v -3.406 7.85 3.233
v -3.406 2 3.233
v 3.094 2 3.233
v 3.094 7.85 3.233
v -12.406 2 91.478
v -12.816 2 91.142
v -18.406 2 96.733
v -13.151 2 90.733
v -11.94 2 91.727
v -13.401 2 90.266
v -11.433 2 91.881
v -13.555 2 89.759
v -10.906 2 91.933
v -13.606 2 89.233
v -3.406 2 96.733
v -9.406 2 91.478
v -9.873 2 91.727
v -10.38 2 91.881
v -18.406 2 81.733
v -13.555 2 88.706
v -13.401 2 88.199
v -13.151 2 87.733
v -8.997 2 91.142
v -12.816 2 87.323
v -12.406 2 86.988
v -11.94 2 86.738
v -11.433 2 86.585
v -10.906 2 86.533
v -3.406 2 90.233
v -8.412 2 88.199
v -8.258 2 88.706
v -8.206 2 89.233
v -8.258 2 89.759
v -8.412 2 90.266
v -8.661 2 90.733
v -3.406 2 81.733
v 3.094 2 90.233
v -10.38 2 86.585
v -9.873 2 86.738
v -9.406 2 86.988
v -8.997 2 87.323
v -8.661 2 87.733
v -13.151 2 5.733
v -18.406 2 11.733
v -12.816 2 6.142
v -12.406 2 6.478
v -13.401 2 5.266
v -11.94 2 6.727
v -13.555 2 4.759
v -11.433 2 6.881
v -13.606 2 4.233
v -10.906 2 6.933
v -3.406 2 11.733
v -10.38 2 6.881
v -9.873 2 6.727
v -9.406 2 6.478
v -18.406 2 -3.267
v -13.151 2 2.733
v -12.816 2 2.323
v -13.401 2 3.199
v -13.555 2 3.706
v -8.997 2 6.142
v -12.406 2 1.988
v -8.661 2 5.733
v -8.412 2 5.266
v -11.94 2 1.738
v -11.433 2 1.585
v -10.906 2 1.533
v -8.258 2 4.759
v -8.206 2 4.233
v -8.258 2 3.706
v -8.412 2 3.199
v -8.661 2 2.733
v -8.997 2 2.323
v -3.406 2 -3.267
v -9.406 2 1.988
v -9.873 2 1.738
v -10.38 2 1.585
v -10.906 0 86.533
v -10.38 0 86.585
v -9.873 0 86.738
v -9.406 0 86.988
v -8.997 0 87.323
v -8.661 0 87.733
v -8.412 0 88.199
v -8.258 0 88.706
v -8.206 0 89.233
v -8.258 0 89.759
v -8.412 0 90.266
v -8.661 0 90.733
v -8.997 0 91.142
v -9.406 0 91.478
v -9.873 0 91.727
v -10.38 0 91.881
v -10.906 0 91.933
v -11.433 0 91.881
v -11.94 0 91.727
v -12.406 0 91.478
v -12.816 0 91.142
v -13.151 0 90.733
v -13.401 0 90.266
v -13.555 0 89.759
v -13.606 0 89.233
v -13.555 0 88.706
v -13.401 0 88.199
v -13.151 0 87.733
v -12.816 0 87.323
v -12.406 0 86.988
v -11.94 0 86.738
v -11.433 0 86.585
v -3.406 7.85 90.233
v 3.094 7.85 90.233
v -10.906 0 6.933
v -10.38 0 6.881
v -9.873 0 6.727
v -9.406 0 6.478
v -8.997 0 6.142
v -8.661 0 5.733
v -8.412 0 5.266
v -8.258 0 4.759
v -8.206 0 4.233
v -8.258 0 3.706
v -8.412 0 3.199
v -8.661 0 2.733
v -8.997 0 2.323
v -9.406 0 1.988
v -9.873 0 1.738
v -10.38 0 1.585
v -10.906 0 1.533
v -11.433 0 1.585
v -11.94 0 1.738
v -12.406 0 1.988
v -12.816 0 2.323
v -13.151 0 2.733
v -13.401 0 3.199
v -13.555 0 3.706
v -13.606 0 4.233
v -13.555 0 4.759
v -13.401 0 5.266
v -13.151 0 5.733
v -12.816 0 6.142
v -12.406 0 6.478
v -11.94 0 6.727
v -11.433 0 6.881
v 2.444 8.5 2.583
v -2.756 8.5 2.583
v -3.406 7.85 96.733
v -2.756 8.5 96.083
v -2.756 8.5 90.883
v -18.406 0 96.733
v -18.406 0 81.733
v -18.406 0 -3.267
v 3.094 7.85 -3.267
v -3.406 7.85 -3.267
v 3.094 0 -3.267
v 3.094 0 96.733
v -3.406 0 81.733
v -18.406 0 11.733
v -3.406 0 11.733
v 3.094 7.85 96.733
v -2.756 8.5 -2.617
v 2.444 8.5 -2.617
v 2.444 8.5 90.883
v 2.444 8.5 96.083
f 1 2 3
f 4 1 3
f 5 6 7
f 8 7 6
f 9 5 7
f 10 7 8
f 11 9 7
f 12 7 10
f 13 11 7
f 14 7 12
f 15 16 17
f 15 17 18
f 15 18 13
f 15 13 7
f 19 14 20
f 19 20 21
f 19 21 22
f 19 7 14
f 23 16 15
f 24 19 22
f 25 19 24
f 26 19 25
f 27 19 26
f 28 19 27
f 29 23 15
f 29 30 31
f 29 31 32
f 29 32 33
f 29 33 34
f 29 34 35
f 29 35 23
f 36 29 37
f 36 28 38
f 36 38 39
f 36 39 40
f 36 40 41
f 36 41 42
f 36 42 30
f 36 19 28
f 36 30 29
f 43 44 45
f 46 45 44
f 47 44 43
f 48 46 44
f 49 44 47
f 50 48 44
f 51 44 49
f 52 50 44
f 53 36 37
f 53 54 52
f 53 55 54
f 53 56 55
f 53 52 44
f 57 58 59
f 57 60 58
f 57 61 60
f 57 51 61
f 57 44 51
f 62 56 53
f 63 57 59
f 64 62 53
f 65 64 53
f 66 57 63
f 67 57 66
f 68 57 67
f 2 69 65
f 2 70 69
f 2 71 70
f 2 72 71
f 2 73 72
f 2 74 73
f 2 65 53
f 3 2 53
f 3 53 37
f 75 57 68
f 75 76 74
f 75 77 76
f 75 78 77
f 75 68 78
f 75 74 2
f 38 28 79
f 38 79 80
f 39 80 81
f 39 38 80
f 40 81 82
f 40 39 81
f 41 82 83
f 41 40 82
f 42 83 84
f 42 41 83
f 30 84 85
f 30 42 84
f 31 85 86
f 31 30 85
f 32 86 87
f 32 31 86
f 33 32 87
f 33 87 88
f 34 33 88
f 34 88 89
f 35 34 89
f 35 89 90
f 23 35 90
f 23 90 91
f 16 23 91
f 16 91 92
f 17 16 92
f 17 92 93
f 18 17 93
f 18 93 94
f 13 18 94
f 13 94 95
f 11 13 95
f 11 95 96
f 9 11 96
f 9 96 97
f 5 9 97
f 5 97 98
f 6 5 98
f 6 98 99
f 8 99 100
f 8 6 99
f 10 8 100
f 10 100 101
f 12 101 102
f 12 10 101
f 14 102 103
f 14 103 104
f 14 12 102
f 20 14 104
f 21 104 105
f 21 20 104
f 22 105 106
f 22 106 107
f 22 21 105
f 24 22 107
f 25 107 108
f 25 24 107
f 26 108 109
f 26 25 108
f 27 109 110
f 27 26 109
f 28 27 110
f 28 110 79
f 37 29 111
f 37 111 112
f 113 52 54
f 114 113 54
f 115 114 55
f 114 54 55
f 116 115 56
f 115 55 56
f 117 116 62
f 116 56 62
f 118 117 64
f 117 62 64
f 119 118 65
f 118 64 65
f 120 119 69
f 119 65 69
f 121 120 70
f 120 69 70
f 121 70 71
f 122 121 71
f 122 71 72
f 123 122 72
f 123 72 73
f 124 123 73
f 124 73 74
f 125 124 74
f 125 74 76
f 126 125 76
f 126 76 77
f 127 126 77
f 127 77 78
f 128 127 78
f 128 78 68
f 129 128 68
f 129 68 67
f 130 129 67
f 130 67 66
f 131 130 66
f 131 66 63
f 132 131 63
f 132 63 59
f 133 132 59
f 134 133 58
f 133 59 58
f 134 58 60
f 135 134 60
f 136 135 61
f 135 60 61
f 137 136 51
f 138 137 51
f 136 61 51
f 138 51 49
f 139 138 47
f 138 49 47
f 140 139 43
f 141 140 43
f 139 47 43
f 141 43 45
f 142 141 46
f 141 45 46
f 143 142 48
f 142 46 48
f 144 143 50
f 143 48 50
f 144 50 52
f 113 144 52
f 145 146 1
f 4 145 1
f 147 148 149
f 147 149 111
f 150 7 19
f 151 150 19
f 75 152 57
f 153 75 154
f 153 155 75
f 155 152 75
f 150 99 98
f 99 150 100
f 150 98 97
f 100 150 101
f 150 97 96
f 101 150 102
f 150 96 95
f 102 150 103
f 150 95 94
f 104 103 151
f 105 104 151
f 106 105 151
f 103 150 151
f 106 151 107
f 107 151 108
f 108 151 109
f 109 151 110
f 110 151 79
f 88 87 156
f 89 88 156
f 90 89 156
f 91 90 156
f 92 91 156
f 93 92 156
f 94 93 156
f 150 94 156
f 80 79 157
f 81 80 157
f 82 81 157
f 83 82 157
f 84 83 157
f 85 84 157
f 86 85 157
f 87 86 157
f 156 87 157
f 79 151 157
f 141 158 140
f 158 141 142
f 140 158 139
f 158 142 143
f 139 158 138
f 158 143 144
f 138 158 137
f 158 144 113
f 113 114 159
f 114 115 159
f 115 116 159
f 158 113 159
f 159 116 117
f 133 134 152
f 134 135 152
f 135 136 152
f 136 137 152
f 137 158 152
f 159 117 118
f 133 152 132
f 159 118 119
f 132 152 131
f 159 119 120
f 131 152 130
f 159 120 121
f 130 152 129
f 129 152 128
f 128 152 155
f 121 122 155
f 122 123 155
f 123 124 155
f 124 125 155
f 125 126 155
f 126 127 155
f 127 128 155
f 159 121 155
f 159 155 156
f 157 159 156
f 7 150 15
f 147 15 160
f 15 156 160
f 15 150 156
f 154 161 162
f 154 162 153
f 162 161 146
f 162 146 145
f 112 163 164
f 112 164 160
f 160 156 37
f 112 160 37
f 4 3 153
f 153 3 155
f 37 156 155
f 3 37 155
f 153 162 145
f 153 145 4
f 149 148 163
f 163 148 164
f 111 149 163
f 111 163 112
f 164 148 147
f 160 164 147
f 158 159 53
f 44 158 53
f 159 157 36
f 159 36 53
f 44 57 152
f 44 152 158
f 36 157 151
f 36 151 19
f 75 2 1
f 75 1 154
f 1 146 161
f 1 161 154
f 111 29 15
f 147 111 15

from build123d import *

# Parameters (mm, degrees)
SKETCH2_W           = 6.5
SKETCH2_H           = 6.5
BOSS_EXTRUDE1_DEPTH = 8.5
SKETCH4_W           = 15
SKETCH4_H           = 2
BOSS_EXTRUDE2_DEPTH = 15
SKETCH5_R           = 2.7
CUT_EXTRUDE1_DEPTH  = 23.774998804
SKETCH6_W           = 6.5
SKETCH6_H           = 87
BOSS_EXTRUDE3_DEPTH = 2
CUT_EXTRUDE3_DEPTH  = 103.034534305
CUT_EXTRUDE4_DEPTH  = 99.257059971
CUT_EXTRUDE5_DEPTH  = 99.257059971
CUT_EXTRUDE6_DEPTH  = 99.257059971
CUT_EXTRUDE7_DEPTH  = 103.034534305


with BuildPart() as part:
    # Sketch2 → Boss-Extrude1 (new body)
    with BuildSketch(Plane(origin=(0, 0, 0), x_dir=(1, 0, 0), z_dir=(0, 1, 0))):
        with Locations((-0.156417112, 0.017379679)):
            Rectangle(SKETCH2_W, SKETCH2_H)
    extrude(amount=BOSS_EXTRUDE1_DEPTH)

    # Sketch4 → Boss-Extrude2 (add)
    with BuildSketch(Plane.ZY.offset(3.406417112)):
        with Locations((4.232620321, 1)):
            Rectangle(SKETCH4_W, SKETCH4_H)
    extrude(amount=BOSS_EXTRUDE2_DEPTH)

    # Sketch5 → Cut-Extrude1 (cut, through all)
    with BuildSketch(Plane(origin=(0, 2, 0), x_dir=(1, 0, 0), z_dir=(0, 1, 0))):
        with Locations(Location((-10.906417112, -4.232620321, 0), (0, 0, 270))):
            Circle(SKETCH5_R)
    extrude(amount=-CUT_EXTRUDE1_DEPTH, mode=Mode.SUBTRACT)


with BuildPart() as body_2:
    # Mirror3: mirrored copy
    add(part.part.mirror(Plane(origin=(-18.406417112, 0, 11.732620321), x_dir=(1, 0, 0), z_dir=(0, 0, -1))))


with BuildPart() as body_2_1:
    # Body-Move/Copy3: moved
    add(body_2.part.moved(Location((0, 0, 70))))


with BuildPart() as part_1:
    add(part.part)

    add(body_2_1.part)  # Boss-Extrude3 merges body 2
    # Sketch6 → Boss-Extrude3 (add)
    with BuildSketch(Plane(origin=(0, 0, 0), x_dir=(1, 0, 0), z_dir=(0, 1, 0))):
        with Locations((-0.156417112, -46.732620321)):
            Rectangle(SKETCH6_W, SKETCH6_H)
    extrude(amount=BOSS_EXTRUDE3_DEPTH)

    # Sketch10 → Cut-Extrude3 (cut, through all)
    with BuildSketch(Plane(origin=(0, 0, -3.267379679), x_dir=(-1, 0, 0), z_dir=(0, 0, -1))):
        Polygon((-2.443582888, 8.5), (-3.093582888, 7.85), (-3.093582888, 8.5), align=None)
    extrude(amount=-CUT_EXTRUDE3_DEPTH, mode=Mode.SUBTRACT)

    # Sketch7 → Cut-Extrude4 (cut, through all)
    with BuildSketch(Plane.ZY.offset(3.406417112)):
        Polygon((2.582620321, 8.5), (3.232620321, 7.85), (3.232620321, 8.5), align=None)
    extrude(amount=-CUT_EXTRUDE4_DEPTH, mode=Mode.SUBTRACT)

    # Sketch12 → Cut-Extrude5 (cut, through all)
    with BuildSketch(Plane.ZY.offset(3.406417112)):
        Polygon((-2.617379679, 8.5), (-3.267379679, 7.85), (-3.267379679, 8.5), align=None)
    extrude(amount=-CUT_EXTRUDE5_DEPTH, mode=Mode.SUBTRACT)

    # Sketch13 → Cut-Extrude6 (cut, through all)
    with BuildSketch(Plane.ZY.offset(3.406417112)):
        Polygon((90.882620321, 8.5), (90.232620321, 7.85), (90.232620321, 8.5), align=None)
        Polygon((96.082620321, 8.5), (96.732620321, 7.85), (96.732620321, 8.5), align=None)
    extrude(amount=-CUT_EXTRUDE6_DEPTH, mode=Mode.SUBTRACT)

    # Sketch11 → Cut-Extrude7 (cut, through all)
    with BuildSketch(Plane(origin=(0, 0, -3.267379679), x_dir=(-1, 0, 0), z_dir=(0, 0, -1))):
        Polygon((2.756417112, 8.5), (3.406417112, 7.85), (3.406417112, 8.5), align=None)
    extrude(amount=-CUT_EXTRUDE7_DEPTH, mode=Mode.SUBTRACT)


solid = part_1.part
